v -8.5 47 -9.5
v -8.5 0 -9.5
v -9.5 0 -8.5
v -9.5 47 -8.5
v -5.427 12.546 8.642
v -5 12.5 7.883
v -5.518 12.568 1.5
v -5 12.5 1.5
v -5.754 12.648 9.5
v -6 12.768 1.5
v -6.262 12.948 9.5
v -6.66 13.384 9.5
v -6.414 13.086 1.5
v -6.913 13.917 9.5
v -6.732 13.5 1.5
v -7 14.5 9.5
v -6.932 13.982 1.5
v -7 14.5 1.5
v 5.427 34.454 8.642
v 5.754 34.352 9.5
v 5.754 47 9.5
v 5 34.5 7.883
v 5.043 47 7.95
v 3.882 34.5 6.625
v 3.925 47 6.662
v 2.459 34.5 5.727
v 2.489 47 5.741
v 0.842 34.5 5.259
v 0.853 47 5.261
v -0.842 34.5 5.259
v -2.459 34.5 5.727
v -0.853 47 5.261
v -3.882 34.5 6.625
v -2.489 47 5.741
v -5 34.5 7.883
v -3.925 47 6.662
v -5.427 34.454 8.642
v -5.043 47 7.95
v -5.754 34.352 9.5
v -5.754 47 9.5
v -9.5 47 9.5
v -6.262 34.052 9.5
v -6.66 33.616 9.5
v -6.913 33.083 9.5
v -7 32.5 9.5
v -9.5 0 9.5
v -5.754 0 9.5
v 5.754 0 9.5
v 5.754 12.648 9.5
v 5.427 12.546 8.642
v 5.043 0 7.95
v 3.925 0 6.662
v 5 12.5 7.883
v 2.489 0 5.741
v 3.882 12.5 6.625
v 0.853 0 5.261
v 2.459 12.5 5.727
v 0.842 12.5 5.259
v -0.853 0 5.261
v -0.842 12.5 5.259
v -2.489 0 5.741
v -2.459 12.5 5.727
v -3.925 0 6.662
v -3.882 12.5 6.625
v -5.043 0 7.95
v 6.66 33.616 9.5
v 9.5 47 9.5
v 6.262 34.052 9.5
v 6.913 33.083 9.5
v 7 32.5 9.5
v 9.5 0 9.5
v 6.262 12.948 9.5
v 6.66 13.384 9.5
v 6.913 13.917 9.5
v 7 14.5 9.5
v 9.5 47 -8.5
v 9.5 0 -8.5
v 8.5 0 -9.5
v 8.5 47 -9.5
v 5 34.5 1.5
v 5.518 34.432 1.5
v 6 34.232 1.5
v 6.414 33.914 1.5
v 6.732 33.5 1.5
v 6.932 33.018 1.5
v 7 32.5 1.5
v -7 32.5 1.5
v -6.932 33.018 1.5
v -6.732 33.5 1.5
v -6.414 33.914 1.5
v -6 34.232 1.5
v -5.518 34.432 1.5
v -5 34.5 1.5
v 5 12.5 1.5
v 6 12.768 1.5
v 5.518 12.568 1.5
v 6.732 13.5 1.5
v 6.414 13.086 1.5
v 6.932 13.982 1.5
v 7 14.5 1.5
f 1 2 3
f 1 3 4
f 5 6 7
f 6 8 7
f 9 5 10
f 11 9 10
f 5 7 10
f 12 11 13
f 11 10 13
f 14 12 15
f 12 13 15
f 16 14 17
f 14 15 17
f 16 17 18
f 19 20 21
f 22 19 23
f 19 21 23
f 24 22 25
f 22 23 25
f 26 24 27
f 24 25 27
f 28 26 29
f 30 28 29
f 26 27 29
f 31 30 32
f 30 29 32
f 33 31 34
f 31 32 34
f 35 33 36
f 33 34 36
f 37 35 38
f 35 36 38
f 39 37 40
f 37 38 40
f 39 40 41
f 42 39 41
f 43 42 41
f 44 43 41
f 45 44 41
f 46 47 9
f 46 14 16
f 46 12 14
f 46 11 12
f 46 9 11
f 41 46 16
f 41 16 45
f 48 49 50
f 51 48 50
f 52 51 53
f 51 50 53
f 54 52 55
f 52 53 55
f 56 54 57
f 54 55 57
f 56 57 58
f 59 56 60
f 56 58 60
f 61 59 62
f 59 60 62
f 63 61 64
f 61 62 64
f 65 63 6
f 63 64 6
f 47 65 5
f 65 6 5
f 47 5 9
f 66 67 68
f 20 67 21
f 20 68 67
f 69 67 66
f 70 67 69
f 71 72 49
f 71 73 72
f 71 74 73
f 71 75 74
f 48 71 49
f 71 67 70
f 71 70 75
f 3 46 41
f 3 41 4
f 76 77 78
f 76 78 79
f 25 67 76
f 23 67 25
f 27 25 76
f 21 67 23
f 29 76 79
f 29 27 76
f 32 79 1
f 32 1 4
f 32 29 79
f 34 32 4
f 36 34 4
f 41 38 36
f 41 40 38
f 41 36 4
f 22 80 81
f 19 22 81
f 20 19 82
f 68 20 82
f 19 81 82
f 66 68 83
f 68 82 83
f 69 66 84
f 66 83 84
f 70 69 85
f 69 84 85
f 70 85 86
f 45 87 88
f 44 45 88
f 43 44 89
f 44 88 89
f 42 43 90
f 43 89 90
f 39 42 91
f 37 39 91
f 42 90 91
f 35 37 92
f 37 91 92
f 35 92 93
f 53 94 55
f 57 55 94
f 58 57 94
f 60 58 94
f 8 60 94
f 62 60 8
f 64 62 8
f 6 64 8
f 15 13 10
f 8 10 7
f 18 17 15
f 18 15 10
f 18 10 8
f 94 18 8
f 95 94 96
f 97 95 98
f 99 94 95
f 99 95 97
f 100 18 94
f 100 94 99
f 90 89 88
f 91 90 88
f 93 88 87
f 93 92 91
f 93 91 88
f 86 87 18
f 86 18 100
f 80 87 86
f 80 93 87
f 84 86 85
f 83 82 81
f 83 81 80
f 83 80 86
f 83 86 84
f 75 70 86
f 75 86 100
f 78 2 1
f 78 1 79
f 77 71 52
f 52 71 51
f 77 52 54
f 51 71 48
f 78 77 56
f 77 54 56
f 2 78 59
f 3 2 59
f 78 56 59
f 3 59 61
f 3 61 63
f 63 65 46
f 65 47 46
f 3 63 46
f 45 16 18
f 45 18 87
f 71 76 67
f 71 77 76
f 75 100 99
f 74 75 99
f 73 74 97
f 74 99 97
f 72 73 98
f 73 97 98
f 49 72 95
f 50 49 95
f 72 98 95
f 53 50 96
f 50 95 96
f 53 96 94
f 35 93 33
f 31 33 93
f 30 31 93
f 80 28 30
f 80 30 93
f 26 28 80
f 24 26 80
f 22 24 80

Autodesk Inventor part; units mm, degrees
ref_plane "YZ Plane" through (0, 0, 0) normal (1, 0, 0) x (0, 1, 0)
ref_plane "XZ Plane" through (0, 0, 0) normal (0, 1, 0) x (-1, 0, 0)
ref_plane "XY Plane" through (0, 0, 0) normal (0, 0, 1) x (1, 0, 0)
sketch "Sketch1" plane through (0, 0, 0) normal (0, 1, 0) x (-1, 0, 0)
  line L0 (-9.5, 9.5) -> (9.5, 9.5)
  line L1 (9.5, 9.5) -> (9.5, -9.5)
  line L2 (9.5, -9.5) -> (-9.5, -9.5)
  line L3 (-9.5, -9.5) -> (-9.5, 9.5)
  line L4 (-9.5, 9.5) -> (9.5, -9.5) construction
  line L5 (9.5, 9.5) -> (-9.5, -9.5) construction
  point P0 (0, 0)
extrude "Extrusion1" add sketch "Sketch1" along normal blind 47
sketch "Sketch2" plane through (-9.5, 0, 9.5) normal (0, 0, 1) x (1, 0, 0)
  line L0 (0, 47) -> (19, 47) construction
  line L1 (9.5, 34.5) -> (9.5, 12.5) construction
  line L2 (2.5, 34.5) -> (16.5, 34.5)
  line L3 (16.5, 34.5) -> (16.5, 12.5)
  line L4 (16.5, 12.5) -> (2.5, 12.5)
  line L5 (2.5, 12.5) -> (2.5, 34.5)
  line L6 (2.5, 34.5) -> (16.5, 12.5) construction
  line L7 (16.5, 34.5) -> (2.5, 12.5) construction
  point P0 (9.5, 0)
  point P1 (9.5, 23.5)
  dimension "d5" = 22
  dimension "d6" = 14
  dimension "d7" = 22
extrude "Extrusion2" cut sketch "Sketch2" against normal blind 8
fillet "Fillet1" radius 2 4 edges at (-7, 34.5, 5.5) (-7, 12.5, 5.5) (7, 34.5, 5.5) (7, 12.5, 5.5)
sketch "Sketch3" plane through (0, 47, 0) normal (0, 1, 0) x (1, 0, 0)
  line L0 (9.5, 9.5) -> (-9.5, 9.5) construction
  line L1 (0, 9.5) -> (0, -11.2) construction
  circle A0 centre (0, -11.2) radius 6
  point P0 (0, 0)
  dimension "d11" = 20.7
  dimension "d12" = 12
extrude "Extrusion3" cut sketch "Sketch3" against normal through all
chamfer "Chamfer1" distance 1 angle 45 2 edges at (-9.5, 23.5, -9.5) (9.5, 23.5, -9.5)
properties part number "Semi cuscinetto 2"
